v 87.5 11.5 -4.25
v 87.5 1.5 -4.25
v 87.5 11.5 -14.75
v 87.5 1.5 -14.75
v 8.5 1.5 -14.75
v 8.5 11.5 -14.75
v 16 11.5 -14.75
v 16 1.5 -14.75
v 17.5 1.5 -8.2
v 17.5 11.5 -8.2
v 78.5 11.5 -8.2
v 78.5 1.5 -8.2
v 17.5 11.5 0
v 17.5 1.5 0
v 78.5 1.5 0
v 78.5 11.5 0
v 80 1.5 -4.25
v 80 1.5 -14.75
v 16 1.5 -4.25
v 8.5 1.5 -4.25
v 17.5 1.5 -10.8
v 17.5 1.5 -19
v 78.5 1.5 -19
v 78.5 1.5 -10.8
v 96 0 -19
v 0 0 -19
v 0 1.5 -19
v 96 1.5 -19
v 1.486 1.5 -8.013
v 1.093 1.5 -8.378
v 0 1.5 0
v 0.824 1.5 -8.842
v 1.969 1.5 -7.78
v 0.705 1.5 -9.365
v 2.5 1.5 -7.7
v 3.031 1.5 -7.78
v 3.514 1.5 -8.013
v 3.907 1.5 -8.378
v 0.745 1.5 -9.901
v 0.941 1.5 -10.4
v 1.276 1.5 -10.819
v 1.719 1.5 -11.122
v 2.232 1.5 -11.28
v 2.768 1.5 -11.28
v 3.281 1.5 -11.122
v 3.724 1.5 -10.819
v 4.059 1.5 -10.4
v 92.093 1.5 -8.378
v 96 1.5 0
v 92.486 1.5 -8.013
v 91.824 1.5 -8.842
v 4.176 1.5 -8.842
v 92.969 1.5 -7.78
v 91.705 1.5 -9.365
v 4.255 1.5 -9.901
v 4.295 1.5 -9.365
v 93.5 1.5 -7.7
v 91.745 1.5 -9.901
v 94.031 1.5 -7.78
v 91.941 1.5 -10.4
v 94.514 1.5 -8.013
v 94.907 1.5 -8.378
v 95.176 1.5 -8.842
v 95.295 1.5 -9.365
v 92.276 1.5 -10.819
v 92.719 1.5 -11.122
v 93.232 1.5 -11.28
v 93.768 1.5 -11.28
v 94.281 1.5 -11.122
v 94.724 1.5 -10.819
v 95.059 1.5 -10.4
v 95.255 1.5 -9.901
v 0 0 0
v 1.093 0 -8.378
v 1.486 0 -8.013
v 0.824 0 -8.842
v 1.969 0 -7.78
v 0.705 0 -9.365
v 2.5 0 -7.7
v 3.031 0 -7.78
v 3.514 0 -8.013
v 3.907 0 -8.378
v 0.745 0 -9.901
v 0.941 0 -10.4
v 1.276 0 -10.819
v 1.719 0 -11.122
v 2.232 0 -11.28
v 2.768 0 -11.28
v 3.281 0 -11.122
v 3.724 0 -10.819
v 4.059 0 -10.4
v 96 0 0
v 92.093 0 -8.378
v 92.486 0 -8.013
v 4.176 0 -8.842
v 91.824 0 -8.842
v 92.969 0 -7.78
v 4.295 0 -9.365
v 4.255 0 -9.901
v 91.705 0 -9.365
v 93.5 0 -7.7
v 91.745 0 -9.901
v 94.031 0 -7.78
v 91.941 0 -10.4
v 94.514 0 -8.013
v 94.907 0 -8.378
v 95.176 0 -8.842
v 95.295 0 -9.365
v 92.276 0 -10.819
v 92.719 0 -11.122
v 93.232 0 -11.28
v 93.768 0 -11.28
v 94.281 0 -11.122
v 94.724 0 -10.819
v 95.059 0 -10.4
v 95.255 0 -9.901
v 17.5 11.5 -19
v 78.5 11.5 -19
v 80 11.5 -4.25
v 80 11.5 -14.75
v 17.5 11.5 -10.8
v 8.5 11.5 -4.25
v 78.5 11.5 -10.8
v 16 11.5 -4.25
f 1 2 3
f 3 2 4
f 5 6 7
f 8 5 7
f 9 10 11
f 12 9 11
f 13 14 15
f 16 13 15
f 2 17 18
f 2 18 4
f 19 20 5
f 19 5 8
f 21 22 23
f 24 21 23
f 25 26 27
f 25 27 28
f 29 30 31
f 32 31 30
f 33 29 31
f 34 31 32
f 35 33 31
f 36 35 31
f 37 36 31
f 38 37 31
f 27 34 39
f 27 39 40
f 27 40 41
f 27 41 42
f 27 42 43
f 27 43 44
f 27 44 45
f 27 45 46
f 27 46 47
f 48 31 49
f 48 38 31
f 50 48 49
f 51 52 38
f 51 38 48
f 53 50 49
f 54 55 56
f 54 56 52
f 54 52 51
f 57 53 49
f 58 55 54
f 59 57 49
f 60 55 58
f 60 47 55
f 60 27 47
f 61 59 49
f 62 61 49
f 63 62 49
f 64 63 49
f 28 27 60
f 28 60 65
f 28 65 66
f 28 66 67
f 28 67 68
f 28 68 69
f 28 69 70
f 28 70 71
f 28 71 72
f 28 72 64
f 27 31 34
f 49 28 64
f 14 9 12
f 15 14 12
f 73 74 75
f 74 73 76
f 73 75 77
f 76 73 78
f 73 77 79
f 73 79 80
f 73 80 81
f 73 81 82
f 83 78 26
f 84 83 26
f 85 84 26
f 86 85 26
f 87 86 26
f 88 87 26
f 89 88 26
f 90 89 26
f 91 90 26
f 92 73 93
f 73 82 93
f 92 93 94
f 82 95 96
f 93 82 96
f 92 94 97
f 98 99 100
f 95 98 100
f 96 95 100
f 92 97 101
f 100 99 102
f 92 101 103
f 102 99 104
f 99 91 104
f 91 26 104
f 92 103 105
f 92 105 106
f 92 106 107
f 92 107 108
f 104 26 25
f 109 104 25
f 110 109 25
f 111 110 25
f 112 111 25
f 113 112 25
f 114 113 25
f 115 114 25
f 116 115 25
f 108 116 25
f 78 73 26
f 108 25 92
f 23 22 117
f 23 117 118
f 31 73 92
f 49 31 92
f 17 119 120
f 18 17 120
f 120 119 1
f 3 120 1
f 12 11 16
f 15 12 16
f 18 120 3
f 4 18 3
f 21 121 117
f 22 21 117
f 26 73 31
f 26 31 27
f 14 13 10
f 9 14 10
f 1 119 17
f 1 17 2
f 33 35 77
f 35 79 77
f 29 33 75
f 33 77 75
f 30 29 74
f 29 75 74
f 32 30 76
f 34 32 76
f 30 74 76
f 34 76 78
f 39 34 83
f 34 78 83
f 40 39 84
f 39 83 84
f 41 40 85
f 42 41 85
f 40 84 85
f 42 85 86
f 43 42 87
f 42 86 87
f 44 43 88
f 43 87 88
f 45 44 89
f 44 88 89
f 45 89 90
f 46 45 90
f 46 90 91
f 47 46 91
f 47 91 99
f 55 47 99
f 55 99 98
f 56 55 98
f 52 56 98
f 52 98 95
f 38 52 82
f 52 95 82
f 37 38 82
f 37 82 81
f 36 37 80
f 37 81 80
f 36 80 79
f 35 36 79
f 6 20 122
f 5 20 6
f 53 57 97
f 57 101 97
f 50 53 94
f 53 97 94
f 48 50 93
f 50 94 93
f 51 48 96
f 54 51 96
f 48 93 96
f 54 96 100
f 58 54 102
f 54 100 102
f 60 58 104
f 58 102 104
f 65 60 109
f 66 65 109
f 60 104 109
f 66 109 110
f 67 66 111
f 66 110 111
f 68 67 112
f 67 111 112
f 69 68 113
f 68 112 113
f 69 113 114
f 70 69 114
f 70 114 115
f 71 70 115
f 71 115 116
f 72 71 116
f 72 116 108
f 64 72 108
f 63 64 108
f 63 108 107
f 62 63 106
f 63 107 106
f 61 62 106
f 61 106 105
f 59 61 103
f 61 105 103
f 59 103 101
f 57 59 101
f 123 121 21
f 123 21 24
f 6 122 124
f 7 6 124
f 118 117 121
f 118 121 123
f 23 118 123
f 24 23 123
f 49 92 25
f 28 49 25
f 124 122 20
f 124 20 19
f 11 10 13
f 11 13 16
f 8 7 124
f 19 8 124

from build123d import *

# Parameters (mm, degrees)
SKETCH1_W                     = 96
SKETCH1_H                     = 19
BOSS_EXTRUDE1_DEPTH           = 1.5
SKETCH2_W                     = 79
SKETCH2_H                     = 19
BOSS_EXTRUDE2_DEPTH           = 10
SKETCH4_W                     = 1.8
SKETCH4_H                     = 1.5
M3_CLEARANCE_HOLE1_AT_2_COUNT = 2
M3_CLEARANCE_HOLE1_AT_2_PITCH = 91
SKETCH5_W                     = 7.5
SKETCH5_H                     = 4.25
SKETCH5_W_2                   = 61
SKETCH5_H_2                   = 2.6
CUT_EXTRUDE2_DEPTH            = 10


with BuildPart() as part:
    # Sketch1 → Boss-Extrude1 (new body)
    with BuildSketch(Plane(origin=(0, 0, 0), x_dir=(1, 0, 0), z_dir=(0, 1, 0))):
        with Locations((48, 9.5)):
            Rectangle(SKETCH1_W, SKETCH1_H)
    extrude(amount=BOSS_EXTRUDE1_DEPTH)

    # Sketch4 → M3 Clearance Hole1 (revolve, cut)
    with BuildSketch(Plane(origin=(2.5, 1.5, -9.5), x_dir=(0, 0, 1), z_dir=(1, 0, 0))):
        with Locations((0.9, 0.75)):
            Rectangle(SKETCH4_W, SKETCH4_H)
    m3_clearance_hole1 = revolve(axis=Axis((2.5, 7.85, -9.5), (0, -1, 0)), mode=Mode.SUBTRACT)

    # M3 Clearance Hole1 at 2: M3 Clearance Hole1 ×2
    with Locations(*[(i * M3_CLEARANCE_HOLE1_AT_2_PITCH, 0, 0) for i in range(1, M3_CLEARANCE_HOLE1_AT_2_COUNT)]):
        add(m3_clearance_hole1, mode=Mode.SUBTRACT)


with BuildPart() as body_2:
    # Sketch2 → Boss-Extrude2 (new body)
    with BuildSketch(Plane(origin=(0, 1.5, 0), x_dir=(1, 0, 0), z_dir=(0, 1, 0))):
        with Locations((48, 9.5)):
            Rectangle(SKETCH2_W, SKETCH2_H)
    extrude(amount=BOSS_EXTRUDE2_DEPTH)

    # Sketch5 → Cut-Extrude2 (cut)
    with BuildSketch(Plane(origin=(0, 11.5, 0), x_dir=(1, 0, 0), z_dir=(0, 1, 0))):
        with Locations((12.25, 16.875)):
            Rectangle(SKETCH5_W, SKETCH5_H)
        with Locations((12.25, 2.125)):
            Rectangle(SKETCH5_W, SKETCH5_H)
        Polygon((16, 19), (16, 14.75), (16, 4.25), (16, 0), (17.5, 0), (17.5, 8.2), (17.5, 10.8), (17.5, 19), align=None)
        with Locations((48, 9.5)):
            Rectangle(SKETCH5_W_2, SKETCH5_H_2)
        Polygon((80, 19), (78.5, 19), (78.5, 10.8), (78.5, 8.2), (78.5, 0), (80, 0), (80, 4.25), (80, 14.75), align=None)
        with Locations((83.75, 16.875)):
            Rectangle(SKETCH5_W, SKETCH5_H)
        with Locations((83.75, 2.125)):
            Rectangle(SKETCH5_W, SKETCH5_H)
    extrude(amount=-CUT_EXTRUDE2_DEPTH, mode=Mode.SUBTRACT)


with BuildPart() as cut_extrude2_piece_1:
    # of the separate pieces the step leaves, piece 1, a body of its own (cut_extrude2_pieces)
    add(body_2.part.solids().sort_by_distance((78.5, 1.5, 0))[0])


with BuildPart() as cut_extrude2_piece_2:
    # of the separate pieces the step leaves, piece 2, a body of its own (cut_extrude2_pieces)
    add(body_2.part.solids().sort_by_distance((17.5, 1.5, -19))[0])


with BuildPart() as cut_extrude2_piece_3:
    # of the separate pieces the step leaves, piece 3, a body of its own (cut_extrude2_pieces)
    add(body_2.part.solids().sort_by_distance((80, 1.5, -14.75))[0])


with BuildPart() as cut_extrude2_piece_4:
    # of the separate pieces the step leaves, piece 4, a body of its own (cut_extrude2_pieces)
    add(body_2.part.solids().sort_by_distance((8.5, 1.5, -4.25))[0])


solid = Compound([part.part, cut_extrude2_piece_1.part, cut_extrude2_piece_2.part, cut_extrude2_piece_3.part, cut_extrude2_piece_4.part])
